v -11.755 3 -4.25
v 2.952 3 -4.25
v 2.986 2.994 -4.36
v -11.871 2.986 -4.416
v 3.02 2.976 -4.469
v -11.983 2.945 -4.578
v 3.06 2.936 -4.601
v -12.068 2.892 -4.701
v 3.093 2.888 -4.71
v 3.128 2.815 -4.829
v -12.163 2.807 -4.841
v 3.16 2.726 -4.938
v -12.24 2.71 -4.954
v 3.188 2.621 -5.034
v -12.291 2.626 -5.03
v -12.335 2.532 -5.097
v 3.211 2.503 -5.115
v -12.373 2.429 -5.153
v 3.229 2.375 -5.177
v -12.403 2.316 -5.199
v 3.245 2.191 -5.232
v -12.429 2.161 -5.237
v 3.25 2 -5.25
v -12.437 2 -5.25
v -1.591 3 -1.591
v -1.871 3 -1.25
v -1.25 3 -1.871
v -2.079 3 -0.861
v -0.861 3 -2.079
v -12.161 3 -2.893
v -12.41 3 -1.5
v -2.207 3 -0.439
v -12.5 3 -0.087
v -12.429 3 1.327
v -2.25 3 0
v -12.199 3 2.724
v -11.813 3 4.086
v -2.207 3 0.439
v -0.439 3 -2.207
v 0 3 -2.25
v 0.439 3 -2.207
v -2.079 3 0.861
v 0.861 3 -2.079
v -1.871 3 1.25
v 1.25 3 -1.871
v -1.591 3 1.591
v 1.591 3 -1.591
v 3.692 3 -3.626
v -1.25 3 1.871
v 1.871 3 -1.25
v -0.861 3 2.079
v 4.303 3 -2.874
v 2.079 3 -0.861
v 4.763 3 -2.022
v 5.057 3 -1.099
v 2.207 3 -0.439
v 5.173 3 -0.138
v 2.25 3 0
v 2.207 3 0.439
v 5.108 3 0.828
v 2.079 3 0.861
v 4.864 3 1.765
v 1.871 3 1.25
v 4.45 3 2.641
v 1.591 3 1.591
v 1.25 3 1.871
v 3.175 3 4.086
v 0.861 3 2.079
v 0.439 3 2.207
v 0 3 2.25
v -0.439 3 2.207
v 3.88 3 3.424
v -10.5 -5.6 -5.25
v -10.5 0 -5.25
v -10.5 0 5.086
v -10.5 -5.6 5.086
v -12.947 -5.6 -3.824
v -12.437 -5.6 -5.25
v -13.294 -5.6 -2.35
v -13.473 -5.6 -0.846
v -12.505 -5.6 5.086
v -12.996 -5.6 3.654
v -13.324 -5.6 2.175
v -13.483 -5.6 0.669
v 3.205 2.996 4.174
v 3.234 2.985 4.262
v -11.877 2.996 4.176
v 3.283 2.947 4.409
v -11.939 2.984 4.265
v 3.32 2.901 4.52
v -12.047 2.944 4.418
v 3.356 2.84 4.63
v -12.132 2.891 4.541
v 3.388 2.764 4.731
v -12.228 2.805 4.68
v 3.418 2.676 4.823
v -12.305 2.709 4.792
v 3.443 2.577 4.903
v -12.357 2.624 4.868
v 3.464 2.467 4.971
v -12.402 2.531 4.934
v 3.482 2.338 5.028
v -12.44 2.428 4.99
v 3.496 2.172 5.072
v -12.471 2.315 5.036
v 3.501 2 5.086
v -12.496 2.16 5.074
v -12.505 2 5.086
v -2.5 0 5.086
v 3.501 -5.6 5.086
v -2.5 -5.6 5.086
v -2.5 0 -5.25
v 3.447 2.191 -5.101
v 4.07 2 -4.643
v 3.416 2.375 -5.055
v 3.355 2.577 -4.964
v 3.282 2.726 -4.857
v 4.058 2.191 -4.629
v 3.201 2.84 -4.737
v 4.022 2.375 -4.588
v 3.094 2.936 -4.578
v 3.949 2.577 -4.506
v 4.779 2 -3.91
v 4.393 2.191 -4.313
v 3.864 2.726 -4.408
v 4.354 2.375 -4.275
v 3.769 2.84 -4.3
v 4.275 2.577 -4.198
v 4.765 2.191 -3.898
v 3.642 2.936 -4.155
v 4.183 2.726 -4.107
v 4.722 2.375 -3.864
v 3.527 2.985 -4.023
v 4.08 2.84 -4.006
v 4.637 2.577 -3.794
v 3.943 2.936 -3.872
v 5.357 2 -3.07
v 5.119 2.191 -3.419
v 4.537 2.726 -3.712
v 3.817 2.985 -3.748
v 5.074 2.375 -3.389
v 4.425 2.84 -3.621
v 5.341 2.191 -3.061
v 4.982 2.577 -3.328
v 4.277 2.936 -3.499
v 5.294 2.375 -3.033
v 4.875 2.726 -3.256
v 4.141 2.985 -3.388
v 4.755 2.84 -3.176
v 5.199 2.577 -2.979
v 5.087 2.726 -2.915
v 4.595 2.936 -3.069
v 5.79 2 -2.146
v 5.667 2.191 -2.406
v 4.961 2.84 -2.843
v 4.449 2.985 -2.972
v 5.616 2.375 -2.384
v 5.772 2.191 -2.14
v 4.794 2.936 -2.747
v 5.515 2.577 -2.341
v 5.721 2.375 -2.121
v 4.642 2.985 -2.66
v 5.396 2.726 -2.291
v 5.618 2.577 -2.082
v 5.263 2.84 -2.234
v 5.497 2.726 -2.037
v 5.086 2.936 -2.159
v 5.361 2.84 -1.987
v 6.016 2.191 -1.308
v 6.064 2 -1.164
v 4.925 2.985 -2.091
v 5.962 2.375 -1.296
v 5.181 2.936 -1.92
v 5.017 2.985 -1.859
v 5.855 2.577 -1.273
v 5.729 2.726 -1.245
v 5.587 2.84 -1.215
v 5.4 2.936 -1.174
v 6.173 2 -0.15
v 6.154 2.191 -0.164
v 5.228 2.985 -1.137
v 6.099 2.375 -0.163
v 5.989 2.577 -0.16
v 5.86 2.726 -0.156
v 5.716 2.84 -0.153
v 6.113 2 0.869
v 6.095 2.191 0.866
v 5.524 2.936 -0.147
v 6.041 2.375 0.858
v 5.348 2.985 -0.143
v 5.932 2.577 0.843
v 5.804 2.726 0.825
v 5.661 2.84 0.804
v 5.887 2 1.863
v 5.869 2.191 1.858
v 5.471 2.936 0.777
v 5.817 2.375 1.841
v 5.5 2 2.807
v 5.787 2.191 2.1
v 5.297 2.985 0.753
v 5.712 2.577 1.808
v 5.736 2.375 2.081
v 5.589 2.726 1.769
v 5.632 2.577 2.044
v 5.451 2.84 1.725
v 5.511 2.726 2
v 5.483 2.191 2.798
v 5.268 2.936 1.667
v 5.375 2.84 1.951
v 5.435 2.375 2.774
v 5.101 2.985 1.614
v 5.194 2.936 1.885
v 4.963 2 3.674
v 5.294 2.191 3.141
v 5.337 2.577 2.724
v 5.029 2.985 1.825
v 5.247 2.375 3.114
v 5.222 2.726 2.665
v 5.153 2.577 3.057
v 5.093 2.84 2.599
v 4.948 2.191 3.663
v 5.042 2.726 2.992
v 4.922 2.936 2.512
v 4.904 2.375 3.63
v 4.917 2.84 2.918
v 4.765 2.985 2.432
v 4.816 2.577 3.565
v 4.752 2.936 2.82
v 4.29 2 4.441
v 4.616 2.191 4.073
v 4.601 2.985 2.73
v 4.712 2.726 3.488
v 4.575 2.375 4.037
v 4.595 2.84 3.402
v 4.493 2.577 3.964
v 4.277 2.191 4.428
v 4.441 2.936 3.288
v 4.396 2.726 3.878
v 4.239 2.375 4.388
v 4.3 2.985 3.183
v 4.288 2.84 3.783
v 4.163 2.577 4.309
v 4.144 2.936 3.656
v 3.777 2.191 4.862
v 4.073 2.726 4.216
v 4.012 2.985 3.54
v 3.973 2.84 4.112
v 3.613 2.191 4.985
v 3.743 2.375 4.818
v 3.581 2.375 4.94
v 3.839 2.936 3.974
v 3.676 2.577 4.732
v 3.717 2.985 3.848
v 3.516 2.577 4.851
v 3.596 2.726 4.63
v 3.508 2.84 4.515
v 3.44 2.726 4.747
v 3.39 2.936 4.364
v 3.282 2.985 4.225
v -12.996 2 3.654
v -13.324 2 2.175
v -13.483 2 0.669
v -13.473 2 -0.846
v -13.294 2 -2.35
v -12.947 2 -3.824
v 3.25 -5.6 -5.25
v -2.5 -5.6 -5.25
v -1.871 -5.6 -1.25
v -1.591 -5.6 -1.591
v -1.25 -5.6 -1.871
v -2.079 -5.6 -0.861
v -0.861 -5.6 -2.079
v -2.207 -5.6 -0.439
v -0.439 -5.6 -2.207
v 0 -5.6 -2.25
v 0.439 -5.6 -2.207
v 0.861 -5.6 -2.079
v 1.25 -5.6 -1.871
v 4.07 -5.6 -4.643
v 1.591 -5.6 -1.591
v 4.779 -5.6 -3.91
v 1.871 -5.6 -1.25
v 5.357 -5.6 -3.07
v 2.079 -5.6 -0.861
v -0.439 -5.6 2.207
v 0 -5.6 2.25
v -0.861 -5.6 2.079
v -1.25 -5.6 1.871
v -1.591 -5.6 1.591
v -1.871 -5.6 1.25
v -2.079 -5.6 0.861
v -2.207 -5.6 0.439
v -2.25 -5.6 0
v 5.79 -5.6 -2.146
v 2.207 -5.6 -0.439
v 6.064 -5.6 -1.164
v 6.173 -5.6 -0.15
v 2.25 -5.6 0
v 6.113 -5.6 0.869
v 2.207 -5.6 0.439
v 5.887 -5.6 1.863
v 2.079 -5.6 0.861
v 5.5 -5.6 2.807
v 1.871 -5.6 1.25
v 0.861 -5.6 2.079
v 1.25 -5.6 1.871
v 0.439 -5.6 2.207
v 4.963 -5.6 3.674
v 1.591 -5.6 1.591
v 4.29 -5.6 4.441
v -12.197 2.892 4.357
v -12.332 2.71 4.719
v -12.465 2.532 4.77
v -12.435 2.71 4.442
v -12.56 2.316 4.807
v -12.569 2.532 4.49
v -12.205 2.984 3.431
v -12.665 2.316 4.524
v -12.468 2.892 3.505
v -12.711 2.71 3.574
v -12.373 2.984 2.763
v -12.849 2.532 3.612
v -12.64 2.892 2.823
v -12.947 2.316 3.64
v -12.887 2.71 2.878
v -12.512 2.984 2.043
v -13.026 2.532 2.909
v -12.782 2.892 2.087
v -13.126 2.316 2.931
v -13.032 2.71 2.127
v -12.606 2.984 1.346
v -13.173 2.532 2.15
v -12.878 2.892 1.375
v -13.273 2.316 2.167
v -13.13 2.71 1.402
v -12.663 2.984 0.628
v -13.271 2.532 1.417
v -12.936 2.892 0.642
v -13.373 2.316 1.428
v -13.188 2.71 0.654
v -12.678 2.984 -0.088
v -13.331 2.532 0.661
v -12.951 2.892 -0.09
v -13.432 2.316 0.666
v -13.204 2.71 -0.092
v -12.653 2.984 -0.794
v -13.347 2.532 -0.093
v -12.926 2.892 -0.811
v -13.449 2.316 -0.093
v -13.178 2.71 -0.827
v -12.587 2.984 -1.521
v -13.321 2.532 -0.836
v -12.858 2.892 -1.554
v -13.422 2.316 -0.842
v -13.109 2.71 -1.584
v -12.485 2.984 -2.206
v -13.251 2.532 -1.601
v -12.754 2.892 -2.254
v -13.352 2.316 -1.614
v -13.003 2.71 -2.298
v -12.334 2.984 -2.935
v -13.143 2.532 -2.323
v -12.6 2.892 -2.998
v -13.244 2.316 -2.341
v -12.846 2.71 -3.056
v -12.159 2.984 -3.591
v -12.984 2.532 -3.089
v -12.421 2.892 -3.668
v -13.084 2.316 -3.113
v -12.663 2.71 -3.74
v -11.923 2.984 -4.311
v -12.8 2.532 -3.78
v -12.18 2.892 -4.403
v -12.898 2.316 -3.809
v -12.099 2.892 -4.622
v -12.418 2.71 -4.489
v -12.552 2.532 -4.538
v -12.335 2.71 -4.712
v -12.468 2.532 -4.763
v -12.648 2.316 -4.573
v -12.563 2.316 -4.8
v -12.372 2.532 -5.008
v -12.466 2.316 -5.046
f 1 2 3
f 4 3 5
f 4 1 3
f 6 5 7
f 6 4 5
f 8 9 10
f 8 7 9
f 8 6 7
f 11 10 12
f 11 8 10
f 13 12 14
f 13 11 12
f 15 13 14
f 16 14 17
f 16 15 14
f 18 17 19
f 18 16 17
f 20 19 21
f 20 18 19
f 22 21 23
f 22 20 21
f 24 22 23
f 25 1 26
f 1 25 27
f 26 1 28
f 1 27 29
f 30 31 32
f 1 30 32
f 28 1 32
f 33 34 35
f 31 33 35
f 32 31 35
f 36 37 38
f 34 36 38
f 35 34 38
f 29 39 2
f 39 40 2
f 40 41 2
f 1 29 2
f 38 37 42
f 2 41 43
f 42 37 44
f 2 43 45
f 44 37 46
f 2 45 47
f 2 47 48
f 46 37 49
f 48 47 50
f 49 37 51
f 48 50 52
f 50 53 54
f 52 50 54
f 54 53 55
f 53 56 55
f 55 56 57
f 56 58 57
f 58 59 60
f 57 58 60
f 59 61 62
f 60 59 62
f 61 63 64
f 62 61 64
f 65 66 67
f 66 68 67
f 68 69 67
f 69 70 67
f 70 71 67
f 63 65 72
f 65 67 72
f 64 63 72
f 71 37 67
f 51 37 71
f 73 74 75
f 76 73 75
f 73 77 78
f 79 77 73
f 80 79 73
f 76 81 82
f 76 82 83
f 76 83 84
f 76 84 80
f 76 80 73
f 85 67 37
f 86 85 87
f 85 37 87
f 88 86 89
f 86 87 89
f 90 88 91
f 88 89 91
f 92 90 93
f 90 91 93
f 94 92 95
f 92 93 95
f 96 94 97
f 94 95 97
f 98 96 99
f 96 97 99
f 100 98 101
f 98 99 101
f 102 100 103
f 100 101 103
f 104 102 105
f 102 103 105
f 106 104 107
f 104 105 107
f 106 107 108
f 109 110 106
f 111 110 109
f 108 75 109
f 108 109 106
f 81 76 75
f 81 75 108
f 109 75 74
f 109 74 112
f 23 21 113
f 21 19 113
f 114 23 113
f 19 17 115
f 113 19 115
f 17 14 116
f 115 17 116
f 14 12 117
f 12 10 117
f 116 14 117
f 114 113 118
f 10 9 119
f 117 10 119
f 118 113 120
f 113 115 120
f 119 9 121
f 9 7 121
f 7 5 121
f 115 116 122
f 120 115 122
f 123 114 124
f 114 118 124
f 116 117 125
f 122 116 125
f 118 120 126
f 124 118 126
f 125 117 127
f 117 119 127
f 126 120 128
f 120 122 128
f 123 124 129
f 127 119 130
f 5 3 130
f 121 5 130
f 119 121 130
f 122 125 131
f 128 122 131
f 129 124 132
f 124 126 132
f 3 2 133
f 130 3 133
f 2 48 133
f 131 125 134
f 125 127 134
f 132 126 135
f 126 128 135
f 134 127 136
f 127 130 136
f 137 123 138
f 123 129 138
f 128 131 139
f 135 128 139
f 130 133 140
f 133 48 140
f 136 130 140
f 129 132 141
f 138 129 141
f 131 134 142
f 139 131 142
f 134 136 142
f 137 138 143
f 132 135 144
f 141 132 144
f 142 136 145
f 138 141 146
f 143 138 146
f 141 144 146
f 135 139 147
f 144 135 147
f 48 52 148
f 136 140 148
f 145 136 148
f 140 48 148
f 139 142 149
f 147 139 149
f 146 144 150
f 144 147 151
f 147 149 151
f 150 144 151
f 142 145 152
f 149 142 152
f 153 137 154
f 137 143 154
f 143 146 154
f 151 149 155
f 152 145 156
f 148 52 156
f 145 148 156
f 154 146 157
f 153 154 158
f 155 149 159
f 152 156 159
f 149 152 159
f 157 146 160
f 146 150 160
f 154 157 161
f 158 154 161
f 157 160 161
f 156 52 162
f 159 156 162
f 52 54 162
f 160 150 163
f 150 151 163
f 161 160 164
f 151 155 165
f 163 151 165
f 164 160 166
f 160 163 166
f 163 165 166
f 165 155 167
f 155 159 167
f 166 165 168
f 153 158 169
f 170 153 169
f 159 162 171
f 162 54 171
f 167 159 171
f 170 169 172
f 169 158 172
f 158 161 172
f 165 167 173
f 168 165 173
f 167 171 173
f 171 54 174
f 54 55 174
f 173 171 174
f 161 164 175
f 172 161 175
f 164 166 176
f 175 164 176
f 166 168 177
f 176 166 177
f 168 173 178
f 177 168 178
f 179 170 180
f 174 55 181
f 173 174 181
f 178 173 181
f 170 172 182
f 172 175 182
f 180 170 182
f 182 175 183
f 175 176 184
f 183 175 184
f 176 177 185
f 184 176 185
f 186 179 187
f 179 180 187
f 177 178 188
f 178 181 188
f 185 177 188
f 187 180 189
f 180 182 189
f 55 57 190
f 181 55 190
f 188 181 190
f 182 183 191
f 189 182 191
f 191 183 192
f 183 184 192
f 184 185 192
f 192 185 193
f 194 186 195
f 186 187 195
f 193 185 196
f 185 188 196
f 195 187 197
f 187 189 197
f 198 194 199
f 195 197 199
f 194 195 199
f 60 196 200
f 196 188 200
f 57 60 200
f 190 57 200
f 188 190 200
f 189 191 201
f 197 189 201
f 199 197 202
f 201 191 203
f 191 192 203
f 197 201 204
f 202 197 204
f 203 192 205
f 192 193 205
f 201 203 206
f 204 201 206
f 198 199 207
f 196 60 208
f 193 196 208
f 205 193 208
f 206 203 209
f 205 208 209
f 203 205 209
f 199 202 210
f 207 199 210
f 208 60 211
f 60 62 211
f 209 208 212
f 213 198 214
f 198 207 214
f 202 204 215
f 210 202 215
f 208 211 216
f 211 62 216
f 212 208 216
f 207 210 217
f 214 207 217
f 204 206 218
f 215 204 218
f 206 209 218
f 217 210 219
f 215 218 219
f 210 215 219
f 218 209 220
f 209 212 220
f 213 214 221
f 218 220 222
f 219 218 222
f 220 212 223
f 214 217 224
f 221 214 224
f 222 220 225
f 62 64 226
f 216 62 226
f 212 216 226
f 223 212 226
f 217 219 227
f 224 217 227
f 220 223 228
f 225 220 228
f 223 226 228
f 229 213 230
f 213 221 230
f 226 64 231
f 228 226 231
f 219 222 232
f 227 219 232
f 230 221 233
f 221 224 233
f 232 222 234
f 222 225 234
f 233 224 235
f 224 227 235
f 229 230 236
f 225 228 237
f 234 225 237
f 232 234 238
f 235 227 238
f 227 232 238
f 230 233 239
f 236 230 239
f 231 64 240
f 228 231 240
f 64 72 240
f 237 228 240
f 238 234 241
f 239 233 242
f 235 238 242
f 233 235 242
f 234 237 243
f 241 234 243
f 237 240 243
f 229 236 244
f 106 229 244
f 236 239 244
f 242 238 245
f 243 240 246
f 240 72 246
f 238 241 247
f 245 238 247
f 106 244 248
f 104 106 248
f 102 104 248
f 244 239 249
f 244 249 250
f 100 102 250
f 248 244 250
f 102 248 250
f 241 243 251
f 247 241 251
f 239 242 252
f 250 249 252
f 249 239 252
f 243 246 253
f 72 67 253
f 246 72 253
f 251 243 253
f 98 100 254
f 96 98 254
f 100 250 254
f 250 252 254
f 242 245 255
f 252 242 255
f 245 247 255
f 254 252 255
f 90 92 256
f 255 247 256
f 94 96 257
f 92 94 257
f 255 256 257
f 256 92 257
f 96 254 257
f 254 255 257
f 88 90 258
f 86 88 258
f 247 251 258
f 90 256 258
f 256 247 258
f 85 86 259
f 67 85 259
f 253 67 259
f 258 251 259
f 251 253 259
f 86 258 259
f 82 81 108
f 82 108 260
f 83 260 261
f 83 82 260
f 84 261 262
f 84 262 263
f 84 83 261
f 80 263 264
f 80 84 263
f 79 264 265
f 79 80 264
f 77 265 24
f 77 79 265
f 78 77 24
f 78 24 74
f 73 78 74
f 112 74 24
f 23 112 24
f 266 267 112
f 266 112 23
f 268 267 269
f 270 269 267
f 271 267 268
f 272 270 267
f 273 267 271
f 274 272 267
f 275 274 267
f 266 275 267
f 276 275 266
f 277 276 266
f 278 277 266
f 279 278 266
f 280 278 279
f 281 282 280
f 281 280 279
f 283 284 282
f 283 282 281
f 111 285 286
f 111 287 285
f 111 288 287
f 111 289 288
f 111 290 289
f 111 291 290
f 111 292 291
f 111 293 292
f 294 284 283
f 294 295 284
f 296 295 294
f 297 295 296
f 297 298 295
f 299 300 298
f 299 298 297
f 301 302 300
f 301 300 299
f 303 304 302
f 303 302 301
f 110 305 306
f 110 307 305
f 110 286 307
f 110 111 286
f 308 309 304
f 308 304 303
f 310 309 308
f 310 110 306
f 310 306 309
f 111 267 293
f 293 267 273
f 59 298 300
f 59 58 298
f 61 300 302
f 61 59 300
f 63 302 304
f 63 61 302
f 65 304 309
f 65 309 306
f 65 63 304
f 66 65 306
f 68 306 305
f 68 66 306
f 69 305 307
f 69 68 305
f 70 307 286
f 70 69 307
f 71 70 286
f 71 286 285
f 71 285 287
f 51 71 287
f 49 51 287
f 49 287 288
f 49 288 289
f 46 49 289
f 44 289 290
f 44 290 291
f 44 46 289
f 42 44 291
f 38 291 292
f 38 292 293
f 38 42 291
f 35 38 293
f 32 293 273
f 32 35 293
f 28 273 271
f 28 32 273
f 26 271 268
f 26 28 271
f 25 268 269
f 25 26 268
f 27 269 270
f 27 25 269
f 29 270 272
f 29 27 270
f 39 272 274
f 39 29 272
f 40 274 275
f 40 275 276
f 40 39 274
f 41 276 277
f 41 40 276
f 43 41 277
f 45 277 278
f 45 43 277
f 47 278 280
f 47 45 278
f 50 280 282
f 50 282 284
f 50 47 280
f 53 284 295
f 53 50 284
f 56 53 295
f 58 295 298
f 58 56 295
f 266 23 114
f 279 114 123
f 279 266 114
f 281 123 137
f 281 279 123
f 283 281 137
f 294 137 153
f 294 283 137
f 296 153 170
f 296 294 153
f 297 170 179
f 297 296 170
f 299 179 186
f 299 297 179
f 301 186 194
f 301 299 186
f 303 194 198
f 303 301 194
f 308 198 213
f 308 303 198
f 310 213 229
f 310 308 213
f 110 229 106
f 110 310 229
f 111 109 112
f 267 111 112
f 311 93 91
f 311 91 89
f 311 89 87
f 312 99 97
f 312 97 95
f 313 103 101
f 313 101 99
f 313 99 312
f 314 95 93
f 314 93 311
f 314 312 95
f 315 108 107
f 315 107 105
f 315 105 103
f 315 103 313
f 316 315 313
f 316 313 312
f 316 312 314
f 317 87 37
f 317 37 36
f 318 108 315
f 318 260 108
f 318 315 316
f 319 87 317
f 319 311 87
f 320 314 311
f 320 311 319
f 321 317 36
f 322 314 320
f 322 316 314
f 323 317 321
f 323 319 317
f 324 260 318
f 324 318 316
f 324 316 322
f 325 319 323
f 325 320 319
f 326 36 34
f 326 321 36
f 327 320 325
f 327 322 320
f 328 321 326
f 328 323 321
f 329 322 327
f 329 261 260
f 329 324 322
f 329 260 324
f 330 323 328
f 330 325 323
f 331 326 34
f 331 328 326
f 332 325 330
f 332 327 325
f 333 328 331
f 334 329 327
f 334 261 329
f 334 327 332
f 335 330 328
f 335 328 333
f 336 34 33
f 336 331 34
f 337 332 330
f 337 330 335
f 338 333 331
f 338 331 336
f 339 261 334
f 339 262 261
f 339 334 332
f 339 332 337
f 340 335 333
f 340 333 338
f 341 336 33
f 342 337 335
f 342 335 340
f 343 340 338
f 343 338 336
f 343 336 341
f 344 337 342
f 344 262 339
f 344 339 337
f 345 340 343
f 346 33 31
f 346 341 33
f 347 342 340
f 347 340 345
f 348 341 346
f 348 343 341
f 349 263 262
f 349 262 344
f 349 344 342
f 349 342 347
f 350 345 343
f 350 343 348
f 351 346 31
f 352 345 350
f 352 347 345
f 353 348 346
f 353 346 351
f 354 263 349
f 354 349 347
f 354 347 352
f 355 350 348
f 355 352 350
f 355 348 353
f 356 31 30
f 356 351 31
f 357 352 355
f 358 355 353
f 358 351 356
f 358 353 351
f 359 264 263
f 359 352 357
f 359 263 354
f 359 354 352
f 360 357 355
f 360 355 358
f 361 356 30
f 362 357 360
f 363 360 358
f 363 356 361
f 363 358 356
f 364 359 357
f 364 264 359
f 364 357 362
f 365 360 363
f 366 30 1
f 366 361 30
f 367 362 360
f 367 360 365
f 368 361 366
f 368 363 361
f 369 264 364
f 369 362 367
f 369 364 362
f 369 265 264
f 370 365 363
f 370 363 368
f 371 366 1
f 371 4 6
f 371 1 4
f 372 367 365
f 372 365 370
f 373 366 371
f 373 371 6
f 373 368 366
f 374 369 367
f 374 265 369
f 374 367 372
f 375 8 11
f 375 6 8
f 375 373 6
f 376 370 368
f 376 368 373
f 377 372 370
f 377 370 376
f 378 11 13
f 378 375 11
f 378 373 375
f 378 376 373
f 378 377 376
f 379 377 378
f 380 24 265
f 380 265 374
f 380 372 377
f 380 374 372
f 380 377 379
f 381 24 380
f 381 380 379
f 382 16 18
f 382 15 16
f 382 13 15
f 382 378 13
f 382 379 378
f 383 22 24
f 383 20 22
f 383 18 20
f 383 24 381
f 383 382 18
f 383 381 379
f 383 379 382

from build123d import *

# Parameters (mm, degrees)
F1_DEPTH    = 5.6
F0_R        = 2.25
F0_W        = 8
F0_H        = 10.336498642
F2_DEPTH    = 3
F3_T1_DEPTH = 20.6876119668
F3_T3_DEPTH = 21.0057116197
F3_T6_ANGLE = 66.24239892
F3_T8_ANGLE = 176.3763770041


# Not quite as in the source:
# - a fillet or chamfer that OpenCascade refuses, or shapes differently, is made with other operations: its cross-section is extruded or revolved along the edge and cut away or added


with BuildPart() as f1:
    # F0 (on Front) → F1 (new body)
    with BuildSketch(Plane.XZ):
        with BuildLine():
            Line((-10.5, 5.086498642), (-12.5051002221, 5.086498642))
            ThreePointArc((-12.5051002221, 5.086498642), (-13.4997099623, -0.0884925705), (-12.4373429638, -5.25))
            Line((-12.4373429638, -5.25), (-10.5, -5.25))
            Line((-10.5, -5.25), (-10.5, 5.086498642))
        make_face()
    extrude(amount=F1_DEPTH)



with BuildPart() as f1b:
    # F0 (on Front) → F1, piece 2 (new body)
    with BuildSketch(Plane.XZ):
        with BuildLine():
            Line((3.5006113976, 5.086498642), (-2.5, 5.086498642))
            Line((-2.5, 5.086498642), (-2.5, -5.25))
            Line((-2.5, -5.25), (3.2502690029, -5.25))
            ThreePointArc((3.2502690029, -5.25), (6.1728759577, -0.1495025156), (3.5006113976, 5.086498642))
        make_face()
        Circle(F0_R, mode=Mode.SUBTRACT)
    extrude(amount=F1_DEPTH)


with BuildPart() as f1_1:
    add(f1.part)

    add(f1b.part)  # F2 merges F1b
    # F0 (on Front) → F2 (join)
    with BuildSketch(Plane.XZ):
        with BuildLine():
            Line((-10.5, 5.086498642), (-12.5051002221, 5.086498642))
            ThreePointArc((-12.5051002221, 5.086498642), (-13.4997099623, -0.0884925705), (-12.4373429638, -5.25))
            Line((-12.4373429638, -5.25), (-10.5, -5.25))
            Line((-10.5, -5.25), (-10.5, 5.086498642))
        make_face()
        with Locations((-6.5, -0.081750679)):
            Rectangle(F0_W, F0_H)
        with BuildLine():
            Line((3.5006113976, 5.086498642), (-2.5, 5.086498642))
            Line((-2.5, 5.086498642), (-2.5, -5.25))
            Line((-2.5, -5.25), (3.2502690029, -5.25))
            ThreePointArc((3.2502690029, -5.25), (6.1728759577, -0.1495025156), (3.5006113976, 5.086498642))
        make_face()
        Circle(F0_R, mode=Mode.SUBTRACT)
    extrude(amount=-F2_DEPTH)

    # F3: fillet of radius 1 on 4 edges, made by hand

    # F3_s2 → F3_t1 (cut)
    with BuildSketch(Plane.YZ.offset(-14.9373429638)):
        with BuildLine():
            ThreePointArc((3, -4.25), (2.7071067812, -4.9571067812), (2, -5.25))
            Line((2, -5.25), (3, -5.25))
            Line((3, -5.25), (3, -4.25))
        make_face()
    extrude(amount=F3_T1_DEPTH, mode=Mode.SUBTRACT)

    # F3_s4 → F3_t3 (cut)
    with BuildSketch(Plane.YZ.offset(-15.0051002221)):
        with BuildLine():
            ThreePointArc((3, 4.086498642), (2.7071067812, 4.7936054231), (2, 5.086498642))
            Line((2, 5.086498642), (3, 5.086498642))
            Line((3, 5.086498642), (3, 4.086498642))
        make_face()
    extrude(amount=F3_T3_DEPTH, mode=Mode.SUBTRACT)

    # F3_s5 → F3_t6 (revolve, cut)
    with BuildSketch(Plane(origin=(0, 0, 0), x_dir=(0, 1, 0), z_dir=(0.5409102149, 0, 0.8410803406))):
        with BuildLine():
            ThreePointArc((3, 12.5), (2.7071067812, 13.2071067812), (2, 13.5))
            Line((2, 13.5), (3, 13.5))
            Line((3, 13.5), (3, 12.5))
        make_face()
    revolve(axis=Axis((0, 3, 0), (0, -1, 0)), revolution_arc=F3_T6_ANGLE, mode=Mode.SUBTRACT)

    # F3_s7 → F3_t8 (revolve, cut)
    with BuildSketch(Plane(origin=(0, 0, 0), x_dir=(0, 1, 0), z_dir=(-0.9888894164, 0, -0.148653026))):
        with BuildLine():
            ThreePointArc((2, 6.1746861128), (2.7071067812, 5.881792894), (3, 5.1746861128))
            Line((3, 5.1746861128), (3, 6.1746861128))
            Line((3, 6.1746861128), (2, 6.1746861128))
        make_face()
    revolve(axis=Axis((0, 3, 0), (0, -1, 0)), revolution_arc=F3_T8_ANGLE, mode=Mode.SUBTRACT)


solid = f1_1.part
